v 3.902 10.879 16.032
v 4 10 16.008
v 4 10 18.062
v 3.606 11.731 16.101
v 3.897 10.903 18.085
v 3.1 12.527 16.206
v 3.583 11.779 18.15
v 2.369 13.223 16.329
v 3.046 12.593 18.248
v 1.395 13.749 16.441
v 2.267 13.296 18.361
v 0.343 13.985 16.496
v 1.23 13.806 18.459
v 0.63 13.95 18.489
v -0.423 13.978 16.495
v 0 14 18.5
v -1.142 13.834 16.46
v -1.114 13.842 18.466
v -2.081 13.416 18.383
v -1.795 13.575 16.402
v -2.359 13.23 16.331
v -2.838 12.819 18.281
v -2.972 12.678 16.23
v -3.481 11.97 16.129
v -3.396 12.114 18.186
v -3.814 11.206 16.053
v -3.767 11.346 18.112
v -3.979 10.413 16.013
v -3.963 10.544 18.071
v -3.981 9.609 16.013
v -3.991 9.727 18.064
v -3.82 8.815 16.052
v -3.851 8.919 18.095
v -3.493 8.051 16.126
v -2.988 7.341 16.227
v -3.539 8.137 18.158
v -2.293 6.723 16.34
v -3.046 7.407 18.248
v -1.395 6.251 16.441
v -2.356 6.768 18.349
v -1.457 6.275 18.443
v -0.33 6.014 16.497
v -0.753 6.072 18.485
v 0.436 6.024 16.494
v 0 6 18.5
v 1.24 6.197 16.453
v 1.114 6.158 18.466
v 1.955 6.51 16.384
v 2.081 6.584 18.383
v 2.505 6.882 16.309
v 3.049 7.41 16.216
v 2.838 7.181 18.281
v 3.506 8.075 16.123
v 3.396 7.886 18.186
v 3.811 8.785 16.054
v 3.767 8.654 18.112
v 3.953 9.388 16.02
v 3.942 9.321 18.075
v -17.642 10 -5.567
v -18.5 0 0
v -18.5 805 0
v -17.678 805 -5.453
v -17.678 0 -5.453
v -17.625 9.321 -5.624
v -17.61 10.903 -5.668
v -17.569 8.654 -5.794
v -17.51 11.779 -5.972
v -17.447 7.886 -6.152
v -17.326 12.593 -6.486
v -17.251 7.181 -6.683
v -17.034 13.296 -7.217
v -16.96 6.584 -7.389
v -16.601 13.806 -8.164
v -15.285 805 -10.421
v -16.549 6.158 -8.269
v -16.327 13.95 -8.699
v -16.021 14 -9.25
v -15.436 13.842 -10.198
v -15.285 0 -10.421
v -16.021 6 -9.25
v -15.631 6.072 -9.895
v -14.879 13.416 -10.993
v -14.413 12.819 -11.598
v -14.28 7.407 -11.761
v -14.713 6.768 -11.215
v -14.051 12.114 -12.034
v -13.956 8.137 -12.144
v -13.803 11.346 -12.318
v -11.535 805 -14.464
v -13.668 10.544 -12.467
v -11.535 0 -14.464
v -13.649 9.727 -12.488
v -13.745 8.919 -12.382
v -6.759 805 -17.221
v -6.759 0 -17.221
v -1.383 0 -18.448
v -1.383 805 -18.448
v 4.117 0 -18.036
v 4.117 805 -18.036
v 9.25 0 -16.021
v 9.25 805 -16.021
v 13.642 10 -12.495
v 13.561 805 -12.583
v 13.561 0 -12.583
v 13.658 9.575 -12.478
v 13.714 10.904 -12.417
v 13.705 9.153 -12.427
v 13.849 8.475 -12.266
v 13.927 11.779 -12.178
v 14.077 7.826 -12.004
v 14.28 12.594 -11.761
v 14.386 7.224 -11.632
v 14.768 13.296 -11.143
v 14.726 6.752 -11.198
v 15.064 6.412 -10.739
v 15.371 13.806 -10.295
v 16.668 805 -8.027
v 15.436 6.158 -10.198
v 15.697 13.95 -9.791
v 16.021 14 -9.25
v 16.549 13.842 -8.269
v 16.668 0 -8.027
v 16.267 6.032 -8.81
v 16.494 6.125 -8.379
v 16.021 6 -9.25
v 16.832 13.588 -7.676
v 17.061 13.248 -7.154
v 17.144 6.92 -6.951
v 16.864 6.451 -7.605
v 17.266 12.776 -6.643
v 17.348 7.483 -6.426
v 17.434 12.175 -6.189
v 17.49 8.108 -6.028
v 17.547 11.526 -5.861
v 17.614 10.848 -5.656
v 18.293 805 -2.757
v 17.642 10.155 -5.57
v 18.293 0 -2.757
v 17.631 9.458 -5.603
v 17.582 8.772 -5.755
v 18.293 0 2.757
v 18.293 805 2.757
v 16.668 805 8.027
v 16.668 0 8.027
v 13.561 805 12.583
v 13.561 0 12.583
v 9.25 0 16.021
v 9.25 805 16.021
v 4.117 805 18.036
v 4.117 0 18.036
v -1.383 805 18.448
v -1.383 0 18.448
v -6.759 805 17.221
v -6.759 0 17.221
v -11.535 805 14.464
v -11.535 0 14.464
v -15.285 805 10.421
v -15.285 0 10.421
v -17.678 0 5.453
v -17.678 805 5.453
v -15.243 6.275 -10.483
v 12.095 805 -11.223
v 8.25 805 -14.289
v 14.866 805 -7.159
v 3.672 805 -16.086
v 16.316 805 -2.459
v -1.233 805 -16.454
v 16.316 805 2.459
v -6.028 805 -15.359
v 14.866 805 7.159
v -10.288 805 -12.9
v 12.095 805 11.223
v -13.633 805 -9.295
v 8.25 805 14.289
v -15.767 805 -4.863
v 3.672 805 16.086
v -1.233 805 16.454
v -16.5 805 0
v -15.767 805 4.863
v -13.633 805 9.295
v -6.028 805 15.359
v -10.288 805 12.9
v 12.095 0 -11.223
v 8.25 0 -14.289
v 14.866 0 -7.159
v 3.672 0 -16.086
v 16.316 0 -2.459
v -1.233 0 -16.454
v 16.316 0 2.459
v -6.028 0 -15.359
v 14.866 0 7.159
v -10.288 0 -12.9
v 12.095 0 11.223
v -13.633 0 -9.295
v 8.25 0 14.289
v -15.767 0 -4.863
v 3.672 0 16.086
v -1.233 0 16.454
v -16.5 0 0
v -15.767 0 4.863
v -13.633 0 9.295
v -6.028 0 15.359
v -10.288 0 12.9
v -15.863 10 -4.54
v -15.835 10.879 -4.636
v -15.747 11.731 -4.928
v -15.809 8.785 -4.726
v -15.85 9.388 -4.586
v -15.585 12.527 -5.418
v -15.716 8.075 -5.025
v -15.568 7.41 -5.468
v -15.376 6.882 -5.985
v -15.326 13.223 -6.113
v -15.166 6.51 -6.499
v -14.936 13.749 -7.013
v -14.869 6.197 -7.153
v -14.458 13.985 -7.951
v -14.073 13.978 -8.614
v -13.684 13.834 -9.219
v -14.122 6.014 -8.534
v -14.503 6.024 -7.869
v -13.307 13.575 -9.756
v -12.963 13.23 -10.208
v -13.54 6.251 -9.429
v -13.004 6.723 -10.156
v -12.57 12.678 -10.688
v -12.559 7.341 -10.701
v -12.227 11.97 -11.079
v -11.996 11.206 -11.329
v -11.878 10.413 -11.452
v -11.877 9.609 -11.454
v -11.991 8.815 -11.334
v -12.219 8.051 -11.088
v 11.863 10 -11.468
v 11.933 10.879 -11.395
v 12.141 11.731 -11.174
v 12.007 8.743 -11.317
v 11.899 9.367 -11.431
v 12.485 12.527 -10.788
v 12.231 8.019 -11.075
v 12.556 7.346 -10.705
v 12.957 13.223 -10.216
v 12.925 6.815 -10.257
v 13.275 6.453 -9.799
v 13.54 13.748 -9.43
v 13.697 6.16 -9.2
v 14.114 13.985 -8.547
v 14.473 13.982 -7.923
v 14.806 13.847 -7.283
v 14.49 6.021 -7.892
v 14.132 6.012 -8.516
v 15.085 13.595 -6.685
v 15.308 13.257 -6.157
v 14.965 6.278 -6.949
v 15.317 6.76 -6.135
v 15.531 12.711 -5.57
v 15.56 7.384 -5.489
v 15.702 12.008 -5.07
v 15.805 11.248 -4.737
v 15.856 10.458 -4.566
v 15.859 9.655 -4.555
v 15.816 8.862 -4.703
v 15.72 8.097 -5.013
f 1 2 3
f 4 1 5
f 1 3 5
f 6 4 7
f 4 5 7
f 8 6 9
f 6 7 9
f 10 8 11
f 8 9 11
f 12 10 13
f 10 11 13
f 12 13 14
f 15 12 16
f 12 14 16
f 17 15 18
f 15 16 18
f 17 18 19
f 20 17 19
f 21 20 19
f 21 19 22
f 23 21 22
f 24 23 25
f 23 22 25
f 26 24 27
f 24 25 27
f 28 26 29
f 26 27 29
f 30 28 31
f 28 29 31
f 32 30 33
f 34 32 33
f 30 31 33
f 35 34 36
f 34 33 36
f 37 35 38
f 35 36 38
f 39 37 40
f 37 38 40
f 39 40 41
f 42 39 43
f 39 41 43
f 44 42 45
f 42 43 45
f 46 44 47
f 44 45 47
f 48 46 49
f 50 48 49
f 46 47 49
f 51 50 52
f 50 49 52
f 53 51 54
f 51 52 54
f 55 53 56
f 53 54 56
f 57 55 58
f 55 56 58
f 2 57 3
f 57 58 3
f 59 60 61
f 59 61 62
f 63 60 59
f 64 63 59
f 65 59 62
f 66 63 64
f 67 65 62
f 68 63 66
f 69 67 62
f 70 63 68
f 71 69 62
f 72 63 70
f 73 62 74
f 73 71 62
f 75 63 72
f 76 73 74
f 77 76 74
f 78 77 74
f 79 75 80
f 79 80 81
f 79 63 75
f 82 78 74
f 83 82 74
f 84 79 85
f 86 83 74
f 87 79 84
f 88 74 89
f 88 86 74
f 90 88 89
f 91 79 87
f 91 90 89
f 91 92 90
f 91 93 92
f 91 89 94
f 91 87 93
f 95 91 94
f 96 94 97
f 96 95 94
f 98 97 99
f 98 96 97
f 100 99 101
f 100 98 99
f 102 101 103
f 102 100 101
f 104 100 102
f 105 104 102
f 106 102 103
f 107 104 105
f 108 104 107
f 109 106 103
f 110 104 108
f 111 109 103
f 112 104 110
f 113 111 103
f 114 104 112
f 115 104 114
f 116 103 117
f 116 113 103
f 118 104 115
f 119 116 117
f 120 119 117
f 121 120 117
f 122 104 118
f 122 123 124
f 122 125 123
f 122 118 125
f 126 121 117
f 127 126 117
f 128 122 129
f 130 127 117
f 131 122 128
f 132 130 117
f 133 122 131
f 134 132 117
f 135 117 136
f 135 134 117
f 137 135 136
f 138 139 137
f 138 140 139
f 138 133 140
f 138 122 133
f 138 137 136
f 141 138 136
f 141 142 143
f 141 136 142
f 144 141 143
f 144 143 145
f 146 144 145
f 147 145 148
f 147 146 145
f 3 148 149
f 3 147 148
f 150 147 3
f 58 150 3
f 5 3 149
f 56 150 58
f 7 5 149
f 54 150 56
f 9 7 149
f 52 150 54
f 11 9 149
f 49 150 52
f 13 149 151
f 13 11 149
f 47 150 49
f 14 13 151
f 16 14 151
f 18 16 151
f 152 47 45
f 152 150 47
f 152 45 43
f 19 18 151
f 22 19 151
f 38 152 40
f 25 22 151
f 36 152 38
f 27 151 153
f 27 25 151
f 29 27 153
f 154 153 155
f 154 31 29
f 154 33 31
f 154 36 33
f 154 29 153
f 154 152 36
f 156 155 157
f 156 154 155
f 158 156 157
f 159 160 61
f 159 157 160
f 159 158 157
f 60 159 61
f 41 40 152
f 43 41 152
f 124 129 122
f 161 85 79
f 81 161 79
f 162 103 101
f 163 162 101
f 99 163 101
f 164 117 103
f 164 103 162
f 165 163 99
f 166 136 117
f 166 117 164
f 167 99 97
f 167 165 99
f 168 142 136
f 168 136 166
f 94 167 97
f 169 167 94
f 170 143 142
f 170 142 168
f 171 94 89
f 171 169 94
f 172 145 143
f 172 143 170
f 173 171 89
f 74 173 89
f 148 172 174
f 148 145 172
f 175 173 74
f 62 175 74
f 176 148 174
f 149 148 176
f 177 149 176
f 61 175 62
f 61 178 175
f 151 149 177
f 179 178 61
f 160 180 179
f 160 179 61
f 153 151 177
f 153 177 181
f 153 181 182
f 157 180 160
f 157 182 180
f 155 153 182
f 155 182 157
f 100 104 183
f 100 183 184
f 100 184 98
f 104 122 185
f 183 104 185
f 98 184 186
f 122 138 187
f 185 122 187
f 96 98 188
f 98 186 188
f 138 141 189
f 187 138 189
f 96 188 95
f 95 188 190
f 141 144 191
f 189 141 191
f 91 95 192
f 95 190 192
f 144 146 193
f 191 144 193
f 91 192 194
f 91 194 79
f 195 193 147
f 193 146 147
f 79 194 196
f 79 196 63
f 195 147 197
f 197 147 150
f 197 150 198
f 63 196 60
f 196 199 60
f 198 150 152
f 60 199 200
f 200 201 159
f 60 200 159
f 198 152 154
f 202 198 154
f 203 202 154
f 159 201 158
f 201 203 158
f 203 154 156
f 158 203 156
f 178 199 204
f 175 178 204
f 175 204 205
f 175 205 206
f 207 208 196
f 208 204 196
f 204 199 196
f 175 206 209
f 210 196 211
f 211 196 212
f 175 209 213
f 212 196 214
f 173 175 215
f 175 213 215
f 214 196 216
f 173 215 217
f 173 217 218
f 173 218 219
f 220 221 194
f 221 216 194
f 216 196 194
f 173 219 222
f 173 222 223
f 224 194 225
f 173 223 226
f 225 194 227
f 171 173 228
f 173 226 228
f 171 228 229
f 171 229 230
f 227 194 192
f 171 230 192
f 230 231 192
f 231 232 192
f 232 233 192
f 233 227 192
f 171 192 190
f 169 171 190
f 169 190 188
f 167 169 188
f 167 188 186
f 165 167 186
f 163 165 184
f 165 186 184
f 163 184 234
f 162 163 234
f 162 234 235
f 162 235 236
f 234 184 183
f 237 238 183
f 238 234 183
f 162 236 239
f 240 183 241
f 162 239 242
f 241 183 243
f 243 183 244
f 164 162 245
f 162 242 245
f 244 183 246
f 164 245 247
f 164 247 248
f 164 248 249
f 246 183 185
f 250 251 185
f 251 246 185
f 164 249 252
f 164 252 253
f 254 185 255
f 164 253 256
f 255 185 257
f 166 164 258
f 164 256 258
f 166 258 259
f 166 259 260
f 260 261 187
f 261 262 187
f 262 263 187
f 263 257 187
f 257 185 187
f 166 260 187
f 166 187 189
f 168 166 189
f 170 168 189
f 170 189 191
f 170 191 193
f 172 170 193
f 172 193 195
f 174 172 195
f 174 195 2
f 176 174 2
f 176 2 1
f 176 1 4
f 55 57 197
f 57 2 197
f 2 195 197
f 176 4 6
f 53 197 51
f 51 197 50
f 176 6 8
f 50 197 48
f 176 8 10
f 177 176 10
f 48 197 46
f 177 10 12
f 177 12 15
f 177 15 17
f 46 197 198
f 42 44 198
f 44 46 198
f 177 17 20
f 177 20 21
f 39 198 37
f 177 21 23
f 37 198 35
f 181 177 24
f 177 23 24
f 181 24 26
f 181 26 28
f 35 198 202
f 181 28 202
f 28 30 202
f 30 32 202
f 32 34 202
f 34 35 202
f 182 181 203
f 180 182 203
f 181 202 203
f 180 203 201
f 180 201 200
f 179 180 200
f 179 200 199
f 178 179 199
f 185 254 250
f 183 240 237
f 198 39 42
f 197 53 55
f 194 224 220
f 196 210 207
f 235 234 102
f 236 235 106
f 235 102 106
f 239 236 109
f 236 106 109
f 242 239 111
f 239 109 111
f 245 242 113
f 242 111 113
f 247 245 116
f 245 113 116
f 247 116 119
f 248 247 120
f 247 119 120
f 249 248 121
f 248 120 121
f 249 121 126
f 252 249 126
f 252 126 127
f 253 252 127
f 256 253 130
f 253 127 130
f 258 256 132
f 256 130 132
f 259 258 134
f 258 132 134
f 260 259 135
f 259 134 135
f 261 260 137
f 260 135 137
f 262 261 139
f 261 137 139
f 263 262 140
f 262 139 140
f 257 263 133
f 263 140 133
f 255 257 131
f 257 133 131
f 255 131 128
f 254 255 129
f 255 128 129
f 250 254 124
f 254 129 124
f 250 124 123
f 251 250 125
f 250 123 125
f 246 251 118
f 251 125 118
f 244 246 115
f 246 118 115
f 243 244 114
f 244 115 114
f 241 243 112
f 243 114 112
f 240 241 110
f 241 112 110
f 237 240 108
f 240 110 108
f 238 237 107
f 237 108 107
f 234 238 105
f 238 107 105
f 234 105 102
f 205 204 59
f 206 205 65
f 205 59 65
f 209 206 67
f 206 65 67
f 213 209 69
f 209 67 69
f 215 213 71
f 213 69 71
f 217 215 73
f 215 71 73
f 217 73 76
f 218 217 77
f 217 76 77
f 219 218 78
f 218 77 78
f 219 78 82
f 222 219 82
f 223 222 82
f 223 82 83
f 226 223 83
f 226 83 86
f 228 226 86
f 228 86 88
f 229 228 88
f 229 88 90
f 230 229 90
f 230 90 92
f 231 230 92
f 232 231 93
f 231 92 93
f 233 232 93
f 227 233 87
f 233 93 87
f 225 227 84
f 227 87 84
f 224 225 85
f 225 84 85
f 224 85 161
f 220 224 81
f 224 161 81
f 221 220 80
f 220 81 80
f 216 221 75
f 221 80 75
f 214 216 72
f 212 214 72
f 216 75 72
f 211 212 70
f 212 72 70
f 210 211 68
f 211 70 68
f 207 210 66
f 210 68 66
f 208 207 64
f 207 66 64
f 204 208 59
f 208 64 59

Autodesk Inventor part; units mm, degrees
ref_plane "XZ Plane" through (0, 0, 0) normal (0, 1, 0) x (-1, 0, 0)
sketch "Boceto1" plane through (0, 0, 0) normal (0, 1, 0) x (-1, 0, 0)
  circle A0 centre (0, 0) radius 18.5
  dimension "d0" = 37
extrude "Extrusión1" add sketch "Boceto1" along normal blind 805
shell "Vaciado1" thickness 2 removed faces 2 at (3.5031, 0, 5.0751) at (3.5031, 805, 5.0751)
ref_plane "Plano de trabajo1" through (0, 0, 18.5) normal (0, 0, 1) x (1, 0, 0)
ref_plane "Plano de trabajo2" through (18.5, 0, 0) normal (1, 0, 0) x (0, 1, 0)
sketch "Boceto4" plane through (0, 0, 18.5) normal (0, 0, 1) x (1, 0, 0)
  line L0 (0, 18.0734) -> (0, -36.4146) construction
  line L1 (47.7272, 0) -> (-52.5468, 0) construction
  circle A0 centre (0, 10) radius 4
  point P0 (0, 0)
  dimension "d14" = 8
  dimension "d15" = 10
extrude "Extrusión4" cut sketch "Boceto4" against normal blind 10
pattern_circular "Patrón circular1" count 3 over 360 about axis through (0, 0, 0) along (0, 1, 0) of "Extrusión4"
